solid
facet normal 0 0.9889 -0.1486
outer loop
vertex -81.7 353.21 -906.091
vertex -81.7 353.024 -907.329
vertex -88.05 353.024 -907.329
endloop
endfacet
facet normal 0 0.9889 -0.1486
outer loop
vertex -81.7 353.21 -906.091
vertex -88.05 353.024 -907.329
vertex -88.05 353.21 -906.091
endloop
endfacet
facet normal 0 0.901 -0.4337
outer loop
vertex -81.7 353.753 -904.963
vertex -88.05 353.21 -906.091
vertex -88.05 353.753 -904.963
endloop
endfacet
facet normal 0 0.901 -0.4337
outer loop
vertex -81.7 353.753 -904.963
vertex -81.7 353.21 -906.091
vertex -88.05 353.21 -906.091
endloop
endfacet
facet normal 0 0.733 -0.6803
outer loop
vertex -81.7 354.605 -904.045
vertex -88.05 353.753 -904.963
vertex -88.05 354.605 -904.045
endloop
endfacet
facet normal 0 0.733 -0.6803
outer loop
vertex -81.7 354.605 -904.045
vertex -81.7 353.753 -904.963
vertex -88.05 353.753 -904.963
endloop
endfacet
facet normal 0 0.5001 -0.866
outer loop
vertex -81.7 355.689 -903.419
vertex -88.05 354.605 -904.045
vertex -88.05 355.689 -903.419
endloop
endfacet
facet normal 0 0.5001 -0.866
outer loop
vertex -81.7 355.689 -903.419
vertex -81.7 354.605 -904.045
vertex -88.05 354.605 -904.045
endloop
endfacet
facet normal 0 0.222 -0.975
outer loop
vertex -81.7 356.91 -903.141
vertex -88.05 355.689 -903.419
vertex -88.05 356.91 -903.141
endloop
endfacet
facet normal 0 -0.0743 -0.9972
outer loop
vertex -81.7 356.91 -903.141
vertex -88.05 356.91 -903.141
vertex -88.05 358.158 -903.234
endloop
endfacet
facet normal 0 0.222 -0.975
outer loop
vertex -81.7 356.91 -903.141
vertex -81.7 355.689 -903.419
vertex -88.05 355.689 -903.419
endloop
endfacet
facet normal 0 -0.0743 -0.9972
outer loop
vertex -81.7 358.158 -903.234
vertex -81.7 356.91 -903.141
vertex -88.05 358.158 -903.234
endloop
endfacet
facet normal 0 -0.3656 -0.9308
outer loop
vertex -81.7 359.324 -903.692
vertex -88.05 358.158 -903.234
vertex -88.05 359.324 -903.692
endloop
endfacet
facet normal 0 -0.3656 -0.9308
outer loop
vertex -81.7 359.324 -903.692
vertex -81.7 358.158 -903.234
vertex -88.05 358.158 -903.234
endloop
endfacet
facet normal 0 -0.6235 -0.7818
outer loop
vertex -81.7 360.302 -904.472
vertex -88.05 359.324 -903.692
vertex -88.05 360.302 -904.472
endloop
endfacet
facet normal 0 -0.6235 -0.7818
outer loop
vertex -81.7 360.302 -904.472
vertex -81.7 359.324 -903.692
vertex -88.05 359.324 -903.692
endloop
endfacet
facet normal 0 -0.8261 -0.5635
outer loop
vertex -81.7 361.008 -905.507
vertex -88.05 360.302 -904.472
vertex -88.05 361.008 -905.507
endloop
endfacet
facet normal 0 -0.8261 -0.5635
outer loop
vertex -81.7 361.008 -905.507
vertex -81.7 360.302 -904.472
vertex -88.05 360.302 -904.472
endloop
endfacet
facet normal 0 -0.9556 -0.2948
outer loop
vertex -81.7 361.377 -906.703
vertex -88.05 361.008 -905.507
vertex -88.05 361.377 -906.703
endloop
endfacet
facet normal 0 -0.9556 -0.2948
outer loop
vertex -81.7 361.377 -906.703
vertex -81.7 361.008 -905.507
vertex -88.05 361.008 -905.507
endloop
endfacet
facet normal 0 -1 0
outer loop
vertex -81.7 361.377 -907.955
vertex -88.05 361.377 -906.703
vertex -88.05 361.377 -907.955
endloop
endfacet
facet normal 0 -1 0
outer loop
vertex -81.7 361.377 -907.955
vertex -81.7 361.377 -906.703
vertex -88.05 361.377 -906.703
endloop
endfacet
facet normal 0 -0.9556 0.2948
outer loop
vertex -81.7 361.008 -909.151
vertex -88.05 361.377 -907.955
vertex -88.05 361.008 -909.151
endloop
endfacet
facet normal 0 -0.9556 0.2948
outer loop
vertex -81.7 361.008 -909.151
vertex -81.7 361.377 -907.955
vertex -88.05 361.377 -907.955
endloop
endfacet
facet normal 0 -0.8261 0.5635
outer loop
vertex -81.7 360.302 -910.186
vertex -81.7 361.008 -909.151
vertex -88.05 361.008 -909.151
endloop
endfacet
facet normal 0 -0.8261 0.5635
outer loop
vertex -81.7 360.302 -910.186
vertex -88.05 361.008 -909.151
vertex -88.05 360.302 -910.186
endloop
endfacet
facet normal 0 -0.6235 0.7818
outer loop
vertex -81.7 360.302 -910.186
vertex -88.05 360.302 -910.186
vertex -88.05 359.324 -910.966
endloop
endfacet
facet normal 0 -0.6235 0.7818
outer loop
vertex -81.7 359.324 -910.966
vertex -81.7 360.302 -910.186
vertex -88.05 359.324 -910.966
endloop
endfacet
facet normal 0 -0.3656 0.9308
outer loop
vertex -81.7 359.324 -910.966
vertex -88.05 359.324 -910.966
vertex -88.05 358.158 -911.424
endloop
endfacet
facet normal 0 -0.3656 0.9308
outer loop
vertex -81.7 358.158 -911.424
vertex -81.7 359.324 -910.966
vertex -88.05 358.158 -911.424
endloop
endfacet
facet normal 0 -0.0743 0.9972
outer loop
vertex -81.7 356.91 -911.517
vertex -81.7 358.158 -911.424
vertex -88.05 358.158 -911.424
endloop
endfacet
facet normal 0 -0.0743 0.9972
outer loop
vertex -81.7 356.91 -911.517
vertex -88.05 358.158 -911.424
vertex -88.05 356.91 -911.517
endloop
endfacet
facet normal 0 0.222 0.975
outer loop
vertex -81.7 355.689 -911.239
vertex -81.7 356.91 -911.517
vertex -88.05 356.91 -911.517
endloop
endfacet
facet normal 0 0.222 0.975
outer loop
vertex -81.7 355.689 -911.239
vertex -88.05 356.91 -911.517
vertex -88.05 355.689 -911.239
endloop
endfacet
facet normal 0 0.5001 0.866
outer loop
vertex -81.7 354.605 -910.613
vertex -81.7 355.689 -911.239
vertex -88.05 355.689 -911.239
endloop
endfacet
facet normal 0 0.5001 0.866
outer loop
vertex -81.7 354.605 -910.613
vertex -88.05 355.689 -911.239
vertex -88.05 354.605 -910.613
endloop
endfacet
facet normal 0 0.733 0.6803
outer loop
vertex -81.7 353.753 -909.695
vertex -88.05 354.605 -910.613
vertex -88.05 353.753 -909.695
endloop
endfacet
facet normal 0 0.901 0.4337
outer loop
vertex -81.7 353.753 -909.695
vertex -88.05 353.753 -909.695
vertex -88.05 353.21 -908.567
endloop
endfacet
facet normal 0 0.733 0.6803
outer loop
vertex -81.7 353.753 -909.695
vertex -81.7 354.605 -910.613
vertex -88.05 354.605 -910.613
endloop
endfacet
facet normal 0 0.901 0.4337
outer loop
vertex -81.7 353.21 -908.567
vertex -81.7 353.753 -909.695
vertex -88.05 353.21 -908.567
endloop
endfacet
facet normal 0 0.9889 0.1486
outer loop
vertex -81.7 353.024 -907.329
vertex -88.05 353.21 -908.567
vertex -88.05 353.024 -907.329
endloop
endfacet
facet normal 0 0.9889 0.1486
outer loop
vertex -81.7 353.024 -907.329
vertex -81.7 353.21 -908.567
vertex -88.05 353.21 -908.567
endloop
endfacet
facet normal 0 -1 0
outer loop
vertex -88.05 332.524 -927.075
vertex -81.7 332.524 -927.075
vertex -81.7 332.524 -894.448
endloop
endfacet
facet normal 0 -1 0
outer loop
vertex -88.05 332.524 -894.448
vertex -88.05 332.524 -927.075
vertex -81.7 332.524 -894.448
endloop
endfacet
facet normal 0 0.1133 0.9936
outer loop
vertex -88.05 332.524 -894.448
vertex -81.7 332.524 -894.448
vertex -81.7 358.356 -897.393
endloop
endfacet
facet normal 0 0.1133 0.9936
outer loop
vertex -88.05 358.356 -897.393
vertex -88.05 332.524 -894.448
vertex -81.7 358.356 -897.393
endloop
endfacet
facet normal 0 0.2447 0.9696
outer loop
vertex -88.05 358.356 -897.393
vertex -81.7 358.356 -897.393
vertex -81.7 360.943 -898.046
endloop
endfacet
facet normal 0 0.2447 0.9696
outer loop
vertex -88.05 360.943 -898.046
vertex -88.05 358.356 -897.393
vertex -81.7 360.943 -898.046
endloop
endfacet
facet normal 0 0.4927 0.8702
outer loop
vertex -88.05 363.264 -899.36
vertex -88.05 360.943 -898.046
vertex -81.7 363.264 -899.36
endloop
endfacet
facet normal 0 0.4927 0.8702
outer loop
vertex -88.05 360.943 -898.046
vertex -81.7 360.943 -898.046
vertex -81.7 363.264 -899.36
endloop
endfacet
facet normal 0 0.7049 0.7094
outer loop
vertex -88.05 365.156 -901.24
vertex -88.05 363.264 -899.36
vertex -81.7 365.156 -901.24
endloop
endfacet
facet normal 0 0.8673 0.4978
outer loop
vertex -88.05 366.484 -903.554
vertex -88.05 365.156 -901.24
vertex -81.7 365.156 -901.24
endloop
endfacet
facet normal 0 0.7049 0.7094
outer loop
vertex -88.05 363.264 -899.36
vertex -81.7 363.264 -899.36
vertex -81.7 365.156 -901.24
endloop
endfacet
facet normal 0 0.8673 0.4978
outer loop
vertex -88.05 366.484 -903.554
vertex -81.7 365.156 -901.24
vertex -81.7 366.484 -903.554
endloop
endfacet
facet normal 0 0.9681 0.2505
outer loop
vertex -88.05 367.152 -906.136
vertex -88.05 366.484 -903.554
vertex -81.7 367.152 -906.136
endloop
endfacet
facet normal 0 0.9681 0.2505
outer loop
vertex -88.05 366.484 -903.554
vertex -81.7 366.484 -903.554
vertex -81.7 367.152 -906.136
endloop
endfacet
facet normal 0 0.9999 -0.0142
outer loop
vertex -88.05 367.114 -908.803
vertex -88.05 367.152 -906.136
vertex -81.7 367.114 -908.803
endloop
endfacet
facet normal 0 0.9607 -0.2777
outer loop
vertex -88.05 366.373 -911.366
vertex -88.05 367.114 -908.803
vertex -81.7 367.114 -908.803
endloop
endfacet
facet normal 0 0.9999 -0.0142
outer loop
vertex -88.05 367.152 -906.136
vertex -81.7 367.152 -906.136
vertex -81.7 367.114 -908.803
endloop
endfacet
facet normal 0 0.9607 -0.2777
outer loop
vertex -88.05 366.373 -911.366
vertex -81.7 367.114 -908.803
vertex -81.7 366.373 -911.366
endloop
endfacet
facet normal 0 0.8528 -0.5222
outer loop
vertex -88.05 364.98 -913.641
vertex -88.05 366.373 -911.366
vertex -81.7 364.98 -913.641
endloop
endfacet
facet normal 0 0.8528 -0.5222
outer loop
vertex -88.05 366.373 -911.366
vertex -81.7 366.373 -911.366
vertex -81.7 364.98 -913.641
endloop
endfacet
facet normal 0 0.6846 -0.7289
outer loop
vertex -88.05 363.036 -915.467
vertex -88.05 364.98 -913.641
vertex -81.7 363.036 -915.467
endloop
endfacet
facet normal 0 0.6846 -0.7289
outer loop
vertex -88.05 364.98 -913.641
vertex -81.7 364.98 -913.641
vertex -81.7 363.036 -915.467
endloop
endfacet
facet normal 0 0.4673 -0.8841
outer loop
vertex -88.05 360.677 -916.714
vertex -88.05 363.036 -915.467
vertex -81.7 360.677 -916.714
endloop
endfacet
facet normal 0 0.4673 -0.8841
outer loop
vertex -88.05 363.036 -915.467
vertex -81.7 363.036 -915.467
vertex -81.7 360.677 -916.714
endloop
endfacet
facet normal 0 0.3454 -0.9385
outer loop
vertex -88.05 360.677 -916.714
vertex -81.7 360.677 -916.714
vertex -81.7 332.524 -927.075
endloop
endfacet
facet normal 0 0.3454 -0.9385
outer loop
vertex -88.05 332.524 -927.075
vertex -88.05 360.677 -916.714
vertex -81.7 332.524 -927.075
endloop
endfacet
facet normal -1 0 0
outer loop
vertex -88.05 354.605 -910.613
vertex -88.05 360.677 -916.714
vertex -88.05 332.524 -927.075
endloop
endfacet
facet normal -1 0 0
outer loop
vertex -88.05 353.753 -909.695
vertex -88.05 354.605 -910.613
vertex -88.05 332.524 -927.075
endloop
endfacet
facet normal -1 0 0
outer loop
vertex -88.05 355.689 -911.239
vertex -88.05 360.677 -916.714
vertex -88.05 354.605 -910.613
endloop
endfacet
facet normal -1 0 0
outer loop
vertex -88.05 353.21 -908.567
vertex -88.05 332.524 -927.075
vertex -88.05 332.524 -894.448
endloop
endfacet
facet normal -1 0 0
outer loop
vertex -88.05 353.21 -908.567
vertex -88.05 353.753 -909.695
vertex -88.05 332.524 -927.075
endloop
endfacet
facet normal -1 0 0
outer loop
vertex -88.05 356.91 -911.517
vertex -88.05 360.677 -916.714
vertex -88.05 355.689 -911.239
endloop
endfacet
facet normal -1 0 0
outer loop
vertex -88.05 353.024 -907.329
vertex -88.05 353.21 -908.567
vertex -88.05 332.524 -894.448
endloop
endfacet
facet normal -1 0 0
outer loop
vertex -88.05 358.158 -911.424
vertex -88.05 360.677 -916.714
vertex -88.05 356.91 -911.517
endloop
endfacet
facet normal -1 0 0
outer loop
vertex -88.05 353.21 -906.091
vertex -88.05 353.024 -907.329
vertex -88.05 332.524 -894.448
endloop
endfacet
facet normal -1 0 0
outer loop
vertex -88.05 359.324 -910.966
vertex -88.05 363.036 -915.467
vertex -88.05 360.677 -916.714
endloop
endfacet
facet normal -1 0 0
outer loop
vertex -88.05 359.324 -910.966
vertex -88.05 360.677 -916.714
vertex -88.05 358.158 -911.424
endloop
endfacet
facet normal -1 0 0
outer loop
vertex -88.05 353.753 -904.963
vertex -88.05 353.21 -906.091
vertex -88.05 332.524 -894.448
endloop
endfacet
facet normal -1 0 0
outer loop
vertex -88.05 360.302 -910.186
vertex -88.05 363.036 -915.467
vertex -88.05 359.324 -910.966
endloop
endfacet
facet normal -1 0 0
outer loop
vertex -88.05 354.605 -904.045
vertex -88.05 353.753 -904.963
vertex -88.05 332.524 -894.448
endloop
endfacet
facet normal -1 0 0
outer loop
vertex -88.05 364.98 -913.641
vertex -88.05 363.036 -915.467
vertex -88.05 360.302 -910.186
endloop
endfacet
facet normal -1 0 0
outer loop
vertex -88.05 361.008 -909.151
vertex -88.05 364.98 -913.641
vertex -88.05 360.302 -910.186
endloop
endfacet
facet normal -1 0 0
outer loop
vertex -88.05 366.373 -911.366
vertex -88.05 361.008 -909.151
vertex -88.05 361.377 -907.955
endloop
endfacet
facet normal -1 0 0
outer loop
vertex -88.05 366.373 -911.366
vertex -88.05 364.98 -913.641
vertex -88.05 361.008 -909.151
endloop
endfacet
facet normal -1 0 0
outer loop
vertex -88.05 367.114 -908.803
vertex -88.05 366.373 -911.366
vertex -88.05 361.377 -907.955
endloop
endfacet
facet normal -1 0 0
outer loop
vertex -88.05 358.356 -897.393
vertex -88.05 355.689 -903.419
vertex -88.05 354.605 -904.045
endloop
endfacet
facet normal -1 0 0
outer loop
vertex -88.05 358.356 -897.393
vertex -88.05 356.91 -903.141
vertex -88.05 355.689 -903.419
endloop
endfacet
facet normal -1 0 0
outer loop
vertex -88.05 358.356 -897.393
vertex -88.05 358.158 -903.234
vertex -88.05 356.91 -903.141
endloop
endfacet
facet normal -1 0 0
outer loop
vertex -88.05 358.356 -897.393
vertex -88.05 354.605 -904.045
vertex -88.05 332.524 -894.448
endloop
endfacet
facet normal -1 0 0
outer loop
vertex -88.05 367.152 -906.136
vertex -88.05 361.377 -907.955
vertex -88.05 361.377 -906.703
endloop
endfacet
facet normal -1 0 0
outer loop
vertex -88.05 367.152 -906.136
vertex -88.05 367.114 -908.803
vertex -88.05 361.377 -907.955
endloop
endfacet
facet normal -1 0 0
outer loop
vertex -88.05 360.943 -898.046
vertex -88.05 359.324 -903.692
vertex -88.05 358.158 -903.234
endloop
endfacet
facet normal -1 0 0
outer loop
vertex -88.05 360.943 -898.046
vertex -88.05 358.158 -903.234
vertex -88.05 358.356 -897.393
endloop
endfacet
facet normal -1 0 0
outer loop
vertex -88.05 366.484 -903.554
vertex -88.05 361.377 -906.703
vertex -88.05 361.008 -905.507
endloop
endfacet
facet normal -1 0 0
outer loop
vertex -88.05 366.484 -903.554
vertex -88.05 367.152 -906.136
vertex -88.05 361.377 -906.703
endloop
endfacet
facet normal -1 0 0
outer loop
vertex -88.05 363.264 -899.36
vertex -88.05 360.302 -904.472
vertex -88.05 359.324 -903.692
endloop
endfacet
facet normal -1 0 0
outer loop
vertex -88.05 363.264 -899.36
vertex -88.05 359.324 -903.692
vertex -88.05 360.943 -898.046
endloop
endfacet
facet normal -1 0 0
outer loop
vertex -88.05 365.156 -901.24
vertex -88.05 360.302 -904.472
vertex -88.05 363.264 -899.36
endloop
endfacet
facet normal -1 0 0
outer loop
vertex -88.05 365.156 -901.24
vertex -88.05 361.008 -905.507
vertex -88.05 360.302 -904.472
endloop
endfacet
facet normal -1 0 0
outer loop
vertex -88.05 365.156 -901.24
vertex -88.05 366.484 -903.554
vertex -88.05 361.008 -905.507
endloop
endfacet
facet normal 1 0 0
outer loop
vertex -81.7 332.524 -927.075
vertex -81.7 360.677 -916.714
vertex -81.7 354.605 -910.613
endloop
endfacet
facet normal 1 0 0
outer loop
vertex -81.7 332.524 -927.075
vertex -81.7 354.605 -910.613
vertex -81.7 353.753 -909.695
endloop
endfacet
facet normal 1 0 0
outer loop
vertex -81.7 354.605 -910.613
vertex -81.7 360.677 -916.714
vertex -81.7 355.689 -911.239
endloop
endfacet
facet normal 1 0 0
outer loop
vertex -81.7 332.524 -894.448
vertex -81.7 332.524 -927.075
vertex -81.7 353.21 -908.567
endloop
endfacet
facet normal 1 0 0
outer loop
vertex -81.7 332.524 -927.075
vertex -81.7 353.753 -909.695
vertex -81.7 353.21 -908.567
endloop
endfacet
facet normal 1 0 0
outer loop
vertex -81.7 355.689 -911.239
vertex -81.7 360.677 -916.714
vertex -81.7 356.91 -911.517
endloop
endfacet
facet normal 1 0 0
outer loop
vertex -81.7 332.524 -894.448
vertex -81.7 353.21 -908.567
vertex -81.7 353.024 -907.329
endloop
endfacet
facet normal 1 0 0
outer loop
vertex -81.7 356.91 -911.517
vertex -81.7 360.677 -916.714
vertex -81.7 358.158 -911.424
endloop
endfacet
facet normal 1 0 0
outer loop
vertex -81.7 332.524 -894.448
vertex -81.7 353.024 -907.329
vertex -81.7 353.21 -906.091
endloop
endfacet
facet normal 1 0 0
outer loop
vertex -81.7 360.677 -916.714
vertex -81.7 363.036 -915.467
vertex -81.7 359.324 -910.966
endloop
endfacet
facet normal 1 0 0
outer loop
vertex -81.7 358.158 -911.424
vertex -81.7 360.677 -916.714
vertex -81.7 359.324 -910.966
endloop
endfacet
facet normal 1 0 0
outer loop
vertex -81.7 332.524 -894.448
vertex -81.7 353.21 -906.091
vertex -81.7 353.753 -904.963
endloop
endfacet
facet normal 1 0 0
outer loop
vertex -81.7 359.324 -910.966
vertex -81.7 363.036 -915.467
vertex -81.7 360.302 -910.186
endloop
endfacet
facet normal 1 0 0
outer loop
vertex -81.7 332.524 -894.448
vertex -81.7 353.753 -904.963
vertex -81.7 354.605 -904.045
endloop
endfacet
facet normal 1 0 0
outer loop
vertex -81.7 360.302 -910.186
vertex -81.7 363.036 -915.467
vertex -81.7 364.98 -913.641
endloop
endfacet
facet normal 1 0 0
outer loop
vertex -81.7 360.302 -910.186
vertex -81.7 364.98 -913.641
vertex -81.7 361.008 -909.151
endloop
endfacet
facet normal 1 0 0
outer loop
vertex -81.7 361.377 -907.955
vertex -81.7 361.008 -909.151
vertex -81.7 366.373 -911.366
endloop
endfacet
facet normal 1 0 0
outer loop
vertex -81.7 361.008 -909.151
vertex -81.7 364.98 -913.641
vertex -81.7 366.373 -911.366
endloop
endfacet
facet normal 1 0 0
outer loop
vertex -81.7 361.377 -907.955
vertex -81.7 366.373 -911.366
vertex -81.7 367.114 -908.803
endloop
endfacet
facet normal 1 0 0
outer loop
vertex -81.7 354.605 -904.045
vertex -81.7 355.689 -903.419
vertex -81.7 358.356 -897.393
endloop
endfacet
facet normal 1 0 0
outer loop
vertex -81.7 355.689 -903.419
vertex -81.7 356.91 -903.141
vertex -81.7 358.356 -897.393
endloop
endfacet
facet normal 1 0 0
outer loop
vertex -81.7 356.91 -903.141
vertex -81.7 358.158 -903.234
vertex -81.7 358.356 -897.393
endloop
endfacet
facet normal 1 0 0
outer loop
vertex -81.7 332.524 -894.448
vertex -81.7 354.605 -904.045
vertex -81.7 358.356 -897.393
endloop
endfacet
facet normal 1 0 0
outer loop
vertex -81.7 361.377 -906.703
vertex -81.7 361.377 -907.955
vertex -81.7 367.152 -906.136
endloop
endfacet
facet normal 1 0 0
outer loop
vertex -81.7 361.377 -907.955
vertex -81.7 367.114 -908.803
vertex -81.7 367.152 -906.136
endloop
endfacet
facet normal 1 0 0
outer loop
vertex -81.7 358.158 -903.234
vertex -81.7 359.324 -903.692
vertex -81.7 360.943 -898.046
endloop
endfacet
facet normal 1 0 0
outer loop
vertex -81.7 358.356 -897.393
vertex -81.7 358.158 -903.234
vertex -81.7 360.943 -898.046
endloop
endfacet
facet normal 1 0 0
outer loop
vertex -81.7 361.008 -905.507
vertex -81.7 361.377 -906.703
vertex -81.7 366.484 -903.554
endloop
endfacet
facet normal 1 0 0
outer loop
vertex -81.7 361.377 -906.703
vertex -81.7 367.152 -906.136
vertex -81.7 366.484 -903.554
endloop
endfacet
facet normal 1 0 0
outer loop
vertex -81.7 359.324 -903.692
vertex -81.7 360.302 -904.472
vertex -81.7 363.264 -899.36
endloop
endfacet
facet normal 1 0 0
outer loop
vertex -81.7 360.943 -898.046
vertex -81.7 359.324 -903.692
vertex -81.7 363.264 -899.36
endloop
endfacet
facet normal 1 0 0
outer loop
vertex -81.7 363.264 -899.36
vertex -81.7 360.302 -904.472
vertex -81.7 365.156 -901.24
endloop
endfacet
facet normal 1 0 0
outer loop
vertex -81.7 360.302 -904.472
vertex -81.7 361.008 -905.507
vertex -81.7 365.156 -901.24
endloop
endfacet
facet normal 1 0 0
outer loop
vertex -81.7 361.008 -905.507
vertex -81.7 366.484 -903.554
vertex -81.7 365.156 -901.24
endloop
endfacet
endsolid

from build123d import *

# Parameters (mm, degrees)
SKETCH1_R           = 4.2
BOSS_EXTRUDE1_DEPTH = 6.35


with BuildPart() as part:
    # Sketch1 → Boss-Extrude1 (new body)
    with BuildSketch(Plane.ZY.offset(81.7)):
        with BuildLine():
            Line((-916.713582015, 360.677443288), (-927.075106991, 332.523601629))
            Line((-927.075106991, 332.523601629), (-894.448362552, 332.523601629))
            Line((-894.448362552, 332.523601629), (-897.39332308, 358.356278755))
            ThreePointArc((-897.39332308, 358.356278755), (-906.13613116, 367.152203744), (-916.713582015, 360.677443288))
        make_face()
        with Locations(Location((-907.328968128, 357.223601629, 0), (0, 0, 270))):
            Circle(SKETCH1_R, mode=Mode.SUBTRACT)
    extrude(amount=BOSS_EXTRUDE1_DEPTH)


solid = part.part
